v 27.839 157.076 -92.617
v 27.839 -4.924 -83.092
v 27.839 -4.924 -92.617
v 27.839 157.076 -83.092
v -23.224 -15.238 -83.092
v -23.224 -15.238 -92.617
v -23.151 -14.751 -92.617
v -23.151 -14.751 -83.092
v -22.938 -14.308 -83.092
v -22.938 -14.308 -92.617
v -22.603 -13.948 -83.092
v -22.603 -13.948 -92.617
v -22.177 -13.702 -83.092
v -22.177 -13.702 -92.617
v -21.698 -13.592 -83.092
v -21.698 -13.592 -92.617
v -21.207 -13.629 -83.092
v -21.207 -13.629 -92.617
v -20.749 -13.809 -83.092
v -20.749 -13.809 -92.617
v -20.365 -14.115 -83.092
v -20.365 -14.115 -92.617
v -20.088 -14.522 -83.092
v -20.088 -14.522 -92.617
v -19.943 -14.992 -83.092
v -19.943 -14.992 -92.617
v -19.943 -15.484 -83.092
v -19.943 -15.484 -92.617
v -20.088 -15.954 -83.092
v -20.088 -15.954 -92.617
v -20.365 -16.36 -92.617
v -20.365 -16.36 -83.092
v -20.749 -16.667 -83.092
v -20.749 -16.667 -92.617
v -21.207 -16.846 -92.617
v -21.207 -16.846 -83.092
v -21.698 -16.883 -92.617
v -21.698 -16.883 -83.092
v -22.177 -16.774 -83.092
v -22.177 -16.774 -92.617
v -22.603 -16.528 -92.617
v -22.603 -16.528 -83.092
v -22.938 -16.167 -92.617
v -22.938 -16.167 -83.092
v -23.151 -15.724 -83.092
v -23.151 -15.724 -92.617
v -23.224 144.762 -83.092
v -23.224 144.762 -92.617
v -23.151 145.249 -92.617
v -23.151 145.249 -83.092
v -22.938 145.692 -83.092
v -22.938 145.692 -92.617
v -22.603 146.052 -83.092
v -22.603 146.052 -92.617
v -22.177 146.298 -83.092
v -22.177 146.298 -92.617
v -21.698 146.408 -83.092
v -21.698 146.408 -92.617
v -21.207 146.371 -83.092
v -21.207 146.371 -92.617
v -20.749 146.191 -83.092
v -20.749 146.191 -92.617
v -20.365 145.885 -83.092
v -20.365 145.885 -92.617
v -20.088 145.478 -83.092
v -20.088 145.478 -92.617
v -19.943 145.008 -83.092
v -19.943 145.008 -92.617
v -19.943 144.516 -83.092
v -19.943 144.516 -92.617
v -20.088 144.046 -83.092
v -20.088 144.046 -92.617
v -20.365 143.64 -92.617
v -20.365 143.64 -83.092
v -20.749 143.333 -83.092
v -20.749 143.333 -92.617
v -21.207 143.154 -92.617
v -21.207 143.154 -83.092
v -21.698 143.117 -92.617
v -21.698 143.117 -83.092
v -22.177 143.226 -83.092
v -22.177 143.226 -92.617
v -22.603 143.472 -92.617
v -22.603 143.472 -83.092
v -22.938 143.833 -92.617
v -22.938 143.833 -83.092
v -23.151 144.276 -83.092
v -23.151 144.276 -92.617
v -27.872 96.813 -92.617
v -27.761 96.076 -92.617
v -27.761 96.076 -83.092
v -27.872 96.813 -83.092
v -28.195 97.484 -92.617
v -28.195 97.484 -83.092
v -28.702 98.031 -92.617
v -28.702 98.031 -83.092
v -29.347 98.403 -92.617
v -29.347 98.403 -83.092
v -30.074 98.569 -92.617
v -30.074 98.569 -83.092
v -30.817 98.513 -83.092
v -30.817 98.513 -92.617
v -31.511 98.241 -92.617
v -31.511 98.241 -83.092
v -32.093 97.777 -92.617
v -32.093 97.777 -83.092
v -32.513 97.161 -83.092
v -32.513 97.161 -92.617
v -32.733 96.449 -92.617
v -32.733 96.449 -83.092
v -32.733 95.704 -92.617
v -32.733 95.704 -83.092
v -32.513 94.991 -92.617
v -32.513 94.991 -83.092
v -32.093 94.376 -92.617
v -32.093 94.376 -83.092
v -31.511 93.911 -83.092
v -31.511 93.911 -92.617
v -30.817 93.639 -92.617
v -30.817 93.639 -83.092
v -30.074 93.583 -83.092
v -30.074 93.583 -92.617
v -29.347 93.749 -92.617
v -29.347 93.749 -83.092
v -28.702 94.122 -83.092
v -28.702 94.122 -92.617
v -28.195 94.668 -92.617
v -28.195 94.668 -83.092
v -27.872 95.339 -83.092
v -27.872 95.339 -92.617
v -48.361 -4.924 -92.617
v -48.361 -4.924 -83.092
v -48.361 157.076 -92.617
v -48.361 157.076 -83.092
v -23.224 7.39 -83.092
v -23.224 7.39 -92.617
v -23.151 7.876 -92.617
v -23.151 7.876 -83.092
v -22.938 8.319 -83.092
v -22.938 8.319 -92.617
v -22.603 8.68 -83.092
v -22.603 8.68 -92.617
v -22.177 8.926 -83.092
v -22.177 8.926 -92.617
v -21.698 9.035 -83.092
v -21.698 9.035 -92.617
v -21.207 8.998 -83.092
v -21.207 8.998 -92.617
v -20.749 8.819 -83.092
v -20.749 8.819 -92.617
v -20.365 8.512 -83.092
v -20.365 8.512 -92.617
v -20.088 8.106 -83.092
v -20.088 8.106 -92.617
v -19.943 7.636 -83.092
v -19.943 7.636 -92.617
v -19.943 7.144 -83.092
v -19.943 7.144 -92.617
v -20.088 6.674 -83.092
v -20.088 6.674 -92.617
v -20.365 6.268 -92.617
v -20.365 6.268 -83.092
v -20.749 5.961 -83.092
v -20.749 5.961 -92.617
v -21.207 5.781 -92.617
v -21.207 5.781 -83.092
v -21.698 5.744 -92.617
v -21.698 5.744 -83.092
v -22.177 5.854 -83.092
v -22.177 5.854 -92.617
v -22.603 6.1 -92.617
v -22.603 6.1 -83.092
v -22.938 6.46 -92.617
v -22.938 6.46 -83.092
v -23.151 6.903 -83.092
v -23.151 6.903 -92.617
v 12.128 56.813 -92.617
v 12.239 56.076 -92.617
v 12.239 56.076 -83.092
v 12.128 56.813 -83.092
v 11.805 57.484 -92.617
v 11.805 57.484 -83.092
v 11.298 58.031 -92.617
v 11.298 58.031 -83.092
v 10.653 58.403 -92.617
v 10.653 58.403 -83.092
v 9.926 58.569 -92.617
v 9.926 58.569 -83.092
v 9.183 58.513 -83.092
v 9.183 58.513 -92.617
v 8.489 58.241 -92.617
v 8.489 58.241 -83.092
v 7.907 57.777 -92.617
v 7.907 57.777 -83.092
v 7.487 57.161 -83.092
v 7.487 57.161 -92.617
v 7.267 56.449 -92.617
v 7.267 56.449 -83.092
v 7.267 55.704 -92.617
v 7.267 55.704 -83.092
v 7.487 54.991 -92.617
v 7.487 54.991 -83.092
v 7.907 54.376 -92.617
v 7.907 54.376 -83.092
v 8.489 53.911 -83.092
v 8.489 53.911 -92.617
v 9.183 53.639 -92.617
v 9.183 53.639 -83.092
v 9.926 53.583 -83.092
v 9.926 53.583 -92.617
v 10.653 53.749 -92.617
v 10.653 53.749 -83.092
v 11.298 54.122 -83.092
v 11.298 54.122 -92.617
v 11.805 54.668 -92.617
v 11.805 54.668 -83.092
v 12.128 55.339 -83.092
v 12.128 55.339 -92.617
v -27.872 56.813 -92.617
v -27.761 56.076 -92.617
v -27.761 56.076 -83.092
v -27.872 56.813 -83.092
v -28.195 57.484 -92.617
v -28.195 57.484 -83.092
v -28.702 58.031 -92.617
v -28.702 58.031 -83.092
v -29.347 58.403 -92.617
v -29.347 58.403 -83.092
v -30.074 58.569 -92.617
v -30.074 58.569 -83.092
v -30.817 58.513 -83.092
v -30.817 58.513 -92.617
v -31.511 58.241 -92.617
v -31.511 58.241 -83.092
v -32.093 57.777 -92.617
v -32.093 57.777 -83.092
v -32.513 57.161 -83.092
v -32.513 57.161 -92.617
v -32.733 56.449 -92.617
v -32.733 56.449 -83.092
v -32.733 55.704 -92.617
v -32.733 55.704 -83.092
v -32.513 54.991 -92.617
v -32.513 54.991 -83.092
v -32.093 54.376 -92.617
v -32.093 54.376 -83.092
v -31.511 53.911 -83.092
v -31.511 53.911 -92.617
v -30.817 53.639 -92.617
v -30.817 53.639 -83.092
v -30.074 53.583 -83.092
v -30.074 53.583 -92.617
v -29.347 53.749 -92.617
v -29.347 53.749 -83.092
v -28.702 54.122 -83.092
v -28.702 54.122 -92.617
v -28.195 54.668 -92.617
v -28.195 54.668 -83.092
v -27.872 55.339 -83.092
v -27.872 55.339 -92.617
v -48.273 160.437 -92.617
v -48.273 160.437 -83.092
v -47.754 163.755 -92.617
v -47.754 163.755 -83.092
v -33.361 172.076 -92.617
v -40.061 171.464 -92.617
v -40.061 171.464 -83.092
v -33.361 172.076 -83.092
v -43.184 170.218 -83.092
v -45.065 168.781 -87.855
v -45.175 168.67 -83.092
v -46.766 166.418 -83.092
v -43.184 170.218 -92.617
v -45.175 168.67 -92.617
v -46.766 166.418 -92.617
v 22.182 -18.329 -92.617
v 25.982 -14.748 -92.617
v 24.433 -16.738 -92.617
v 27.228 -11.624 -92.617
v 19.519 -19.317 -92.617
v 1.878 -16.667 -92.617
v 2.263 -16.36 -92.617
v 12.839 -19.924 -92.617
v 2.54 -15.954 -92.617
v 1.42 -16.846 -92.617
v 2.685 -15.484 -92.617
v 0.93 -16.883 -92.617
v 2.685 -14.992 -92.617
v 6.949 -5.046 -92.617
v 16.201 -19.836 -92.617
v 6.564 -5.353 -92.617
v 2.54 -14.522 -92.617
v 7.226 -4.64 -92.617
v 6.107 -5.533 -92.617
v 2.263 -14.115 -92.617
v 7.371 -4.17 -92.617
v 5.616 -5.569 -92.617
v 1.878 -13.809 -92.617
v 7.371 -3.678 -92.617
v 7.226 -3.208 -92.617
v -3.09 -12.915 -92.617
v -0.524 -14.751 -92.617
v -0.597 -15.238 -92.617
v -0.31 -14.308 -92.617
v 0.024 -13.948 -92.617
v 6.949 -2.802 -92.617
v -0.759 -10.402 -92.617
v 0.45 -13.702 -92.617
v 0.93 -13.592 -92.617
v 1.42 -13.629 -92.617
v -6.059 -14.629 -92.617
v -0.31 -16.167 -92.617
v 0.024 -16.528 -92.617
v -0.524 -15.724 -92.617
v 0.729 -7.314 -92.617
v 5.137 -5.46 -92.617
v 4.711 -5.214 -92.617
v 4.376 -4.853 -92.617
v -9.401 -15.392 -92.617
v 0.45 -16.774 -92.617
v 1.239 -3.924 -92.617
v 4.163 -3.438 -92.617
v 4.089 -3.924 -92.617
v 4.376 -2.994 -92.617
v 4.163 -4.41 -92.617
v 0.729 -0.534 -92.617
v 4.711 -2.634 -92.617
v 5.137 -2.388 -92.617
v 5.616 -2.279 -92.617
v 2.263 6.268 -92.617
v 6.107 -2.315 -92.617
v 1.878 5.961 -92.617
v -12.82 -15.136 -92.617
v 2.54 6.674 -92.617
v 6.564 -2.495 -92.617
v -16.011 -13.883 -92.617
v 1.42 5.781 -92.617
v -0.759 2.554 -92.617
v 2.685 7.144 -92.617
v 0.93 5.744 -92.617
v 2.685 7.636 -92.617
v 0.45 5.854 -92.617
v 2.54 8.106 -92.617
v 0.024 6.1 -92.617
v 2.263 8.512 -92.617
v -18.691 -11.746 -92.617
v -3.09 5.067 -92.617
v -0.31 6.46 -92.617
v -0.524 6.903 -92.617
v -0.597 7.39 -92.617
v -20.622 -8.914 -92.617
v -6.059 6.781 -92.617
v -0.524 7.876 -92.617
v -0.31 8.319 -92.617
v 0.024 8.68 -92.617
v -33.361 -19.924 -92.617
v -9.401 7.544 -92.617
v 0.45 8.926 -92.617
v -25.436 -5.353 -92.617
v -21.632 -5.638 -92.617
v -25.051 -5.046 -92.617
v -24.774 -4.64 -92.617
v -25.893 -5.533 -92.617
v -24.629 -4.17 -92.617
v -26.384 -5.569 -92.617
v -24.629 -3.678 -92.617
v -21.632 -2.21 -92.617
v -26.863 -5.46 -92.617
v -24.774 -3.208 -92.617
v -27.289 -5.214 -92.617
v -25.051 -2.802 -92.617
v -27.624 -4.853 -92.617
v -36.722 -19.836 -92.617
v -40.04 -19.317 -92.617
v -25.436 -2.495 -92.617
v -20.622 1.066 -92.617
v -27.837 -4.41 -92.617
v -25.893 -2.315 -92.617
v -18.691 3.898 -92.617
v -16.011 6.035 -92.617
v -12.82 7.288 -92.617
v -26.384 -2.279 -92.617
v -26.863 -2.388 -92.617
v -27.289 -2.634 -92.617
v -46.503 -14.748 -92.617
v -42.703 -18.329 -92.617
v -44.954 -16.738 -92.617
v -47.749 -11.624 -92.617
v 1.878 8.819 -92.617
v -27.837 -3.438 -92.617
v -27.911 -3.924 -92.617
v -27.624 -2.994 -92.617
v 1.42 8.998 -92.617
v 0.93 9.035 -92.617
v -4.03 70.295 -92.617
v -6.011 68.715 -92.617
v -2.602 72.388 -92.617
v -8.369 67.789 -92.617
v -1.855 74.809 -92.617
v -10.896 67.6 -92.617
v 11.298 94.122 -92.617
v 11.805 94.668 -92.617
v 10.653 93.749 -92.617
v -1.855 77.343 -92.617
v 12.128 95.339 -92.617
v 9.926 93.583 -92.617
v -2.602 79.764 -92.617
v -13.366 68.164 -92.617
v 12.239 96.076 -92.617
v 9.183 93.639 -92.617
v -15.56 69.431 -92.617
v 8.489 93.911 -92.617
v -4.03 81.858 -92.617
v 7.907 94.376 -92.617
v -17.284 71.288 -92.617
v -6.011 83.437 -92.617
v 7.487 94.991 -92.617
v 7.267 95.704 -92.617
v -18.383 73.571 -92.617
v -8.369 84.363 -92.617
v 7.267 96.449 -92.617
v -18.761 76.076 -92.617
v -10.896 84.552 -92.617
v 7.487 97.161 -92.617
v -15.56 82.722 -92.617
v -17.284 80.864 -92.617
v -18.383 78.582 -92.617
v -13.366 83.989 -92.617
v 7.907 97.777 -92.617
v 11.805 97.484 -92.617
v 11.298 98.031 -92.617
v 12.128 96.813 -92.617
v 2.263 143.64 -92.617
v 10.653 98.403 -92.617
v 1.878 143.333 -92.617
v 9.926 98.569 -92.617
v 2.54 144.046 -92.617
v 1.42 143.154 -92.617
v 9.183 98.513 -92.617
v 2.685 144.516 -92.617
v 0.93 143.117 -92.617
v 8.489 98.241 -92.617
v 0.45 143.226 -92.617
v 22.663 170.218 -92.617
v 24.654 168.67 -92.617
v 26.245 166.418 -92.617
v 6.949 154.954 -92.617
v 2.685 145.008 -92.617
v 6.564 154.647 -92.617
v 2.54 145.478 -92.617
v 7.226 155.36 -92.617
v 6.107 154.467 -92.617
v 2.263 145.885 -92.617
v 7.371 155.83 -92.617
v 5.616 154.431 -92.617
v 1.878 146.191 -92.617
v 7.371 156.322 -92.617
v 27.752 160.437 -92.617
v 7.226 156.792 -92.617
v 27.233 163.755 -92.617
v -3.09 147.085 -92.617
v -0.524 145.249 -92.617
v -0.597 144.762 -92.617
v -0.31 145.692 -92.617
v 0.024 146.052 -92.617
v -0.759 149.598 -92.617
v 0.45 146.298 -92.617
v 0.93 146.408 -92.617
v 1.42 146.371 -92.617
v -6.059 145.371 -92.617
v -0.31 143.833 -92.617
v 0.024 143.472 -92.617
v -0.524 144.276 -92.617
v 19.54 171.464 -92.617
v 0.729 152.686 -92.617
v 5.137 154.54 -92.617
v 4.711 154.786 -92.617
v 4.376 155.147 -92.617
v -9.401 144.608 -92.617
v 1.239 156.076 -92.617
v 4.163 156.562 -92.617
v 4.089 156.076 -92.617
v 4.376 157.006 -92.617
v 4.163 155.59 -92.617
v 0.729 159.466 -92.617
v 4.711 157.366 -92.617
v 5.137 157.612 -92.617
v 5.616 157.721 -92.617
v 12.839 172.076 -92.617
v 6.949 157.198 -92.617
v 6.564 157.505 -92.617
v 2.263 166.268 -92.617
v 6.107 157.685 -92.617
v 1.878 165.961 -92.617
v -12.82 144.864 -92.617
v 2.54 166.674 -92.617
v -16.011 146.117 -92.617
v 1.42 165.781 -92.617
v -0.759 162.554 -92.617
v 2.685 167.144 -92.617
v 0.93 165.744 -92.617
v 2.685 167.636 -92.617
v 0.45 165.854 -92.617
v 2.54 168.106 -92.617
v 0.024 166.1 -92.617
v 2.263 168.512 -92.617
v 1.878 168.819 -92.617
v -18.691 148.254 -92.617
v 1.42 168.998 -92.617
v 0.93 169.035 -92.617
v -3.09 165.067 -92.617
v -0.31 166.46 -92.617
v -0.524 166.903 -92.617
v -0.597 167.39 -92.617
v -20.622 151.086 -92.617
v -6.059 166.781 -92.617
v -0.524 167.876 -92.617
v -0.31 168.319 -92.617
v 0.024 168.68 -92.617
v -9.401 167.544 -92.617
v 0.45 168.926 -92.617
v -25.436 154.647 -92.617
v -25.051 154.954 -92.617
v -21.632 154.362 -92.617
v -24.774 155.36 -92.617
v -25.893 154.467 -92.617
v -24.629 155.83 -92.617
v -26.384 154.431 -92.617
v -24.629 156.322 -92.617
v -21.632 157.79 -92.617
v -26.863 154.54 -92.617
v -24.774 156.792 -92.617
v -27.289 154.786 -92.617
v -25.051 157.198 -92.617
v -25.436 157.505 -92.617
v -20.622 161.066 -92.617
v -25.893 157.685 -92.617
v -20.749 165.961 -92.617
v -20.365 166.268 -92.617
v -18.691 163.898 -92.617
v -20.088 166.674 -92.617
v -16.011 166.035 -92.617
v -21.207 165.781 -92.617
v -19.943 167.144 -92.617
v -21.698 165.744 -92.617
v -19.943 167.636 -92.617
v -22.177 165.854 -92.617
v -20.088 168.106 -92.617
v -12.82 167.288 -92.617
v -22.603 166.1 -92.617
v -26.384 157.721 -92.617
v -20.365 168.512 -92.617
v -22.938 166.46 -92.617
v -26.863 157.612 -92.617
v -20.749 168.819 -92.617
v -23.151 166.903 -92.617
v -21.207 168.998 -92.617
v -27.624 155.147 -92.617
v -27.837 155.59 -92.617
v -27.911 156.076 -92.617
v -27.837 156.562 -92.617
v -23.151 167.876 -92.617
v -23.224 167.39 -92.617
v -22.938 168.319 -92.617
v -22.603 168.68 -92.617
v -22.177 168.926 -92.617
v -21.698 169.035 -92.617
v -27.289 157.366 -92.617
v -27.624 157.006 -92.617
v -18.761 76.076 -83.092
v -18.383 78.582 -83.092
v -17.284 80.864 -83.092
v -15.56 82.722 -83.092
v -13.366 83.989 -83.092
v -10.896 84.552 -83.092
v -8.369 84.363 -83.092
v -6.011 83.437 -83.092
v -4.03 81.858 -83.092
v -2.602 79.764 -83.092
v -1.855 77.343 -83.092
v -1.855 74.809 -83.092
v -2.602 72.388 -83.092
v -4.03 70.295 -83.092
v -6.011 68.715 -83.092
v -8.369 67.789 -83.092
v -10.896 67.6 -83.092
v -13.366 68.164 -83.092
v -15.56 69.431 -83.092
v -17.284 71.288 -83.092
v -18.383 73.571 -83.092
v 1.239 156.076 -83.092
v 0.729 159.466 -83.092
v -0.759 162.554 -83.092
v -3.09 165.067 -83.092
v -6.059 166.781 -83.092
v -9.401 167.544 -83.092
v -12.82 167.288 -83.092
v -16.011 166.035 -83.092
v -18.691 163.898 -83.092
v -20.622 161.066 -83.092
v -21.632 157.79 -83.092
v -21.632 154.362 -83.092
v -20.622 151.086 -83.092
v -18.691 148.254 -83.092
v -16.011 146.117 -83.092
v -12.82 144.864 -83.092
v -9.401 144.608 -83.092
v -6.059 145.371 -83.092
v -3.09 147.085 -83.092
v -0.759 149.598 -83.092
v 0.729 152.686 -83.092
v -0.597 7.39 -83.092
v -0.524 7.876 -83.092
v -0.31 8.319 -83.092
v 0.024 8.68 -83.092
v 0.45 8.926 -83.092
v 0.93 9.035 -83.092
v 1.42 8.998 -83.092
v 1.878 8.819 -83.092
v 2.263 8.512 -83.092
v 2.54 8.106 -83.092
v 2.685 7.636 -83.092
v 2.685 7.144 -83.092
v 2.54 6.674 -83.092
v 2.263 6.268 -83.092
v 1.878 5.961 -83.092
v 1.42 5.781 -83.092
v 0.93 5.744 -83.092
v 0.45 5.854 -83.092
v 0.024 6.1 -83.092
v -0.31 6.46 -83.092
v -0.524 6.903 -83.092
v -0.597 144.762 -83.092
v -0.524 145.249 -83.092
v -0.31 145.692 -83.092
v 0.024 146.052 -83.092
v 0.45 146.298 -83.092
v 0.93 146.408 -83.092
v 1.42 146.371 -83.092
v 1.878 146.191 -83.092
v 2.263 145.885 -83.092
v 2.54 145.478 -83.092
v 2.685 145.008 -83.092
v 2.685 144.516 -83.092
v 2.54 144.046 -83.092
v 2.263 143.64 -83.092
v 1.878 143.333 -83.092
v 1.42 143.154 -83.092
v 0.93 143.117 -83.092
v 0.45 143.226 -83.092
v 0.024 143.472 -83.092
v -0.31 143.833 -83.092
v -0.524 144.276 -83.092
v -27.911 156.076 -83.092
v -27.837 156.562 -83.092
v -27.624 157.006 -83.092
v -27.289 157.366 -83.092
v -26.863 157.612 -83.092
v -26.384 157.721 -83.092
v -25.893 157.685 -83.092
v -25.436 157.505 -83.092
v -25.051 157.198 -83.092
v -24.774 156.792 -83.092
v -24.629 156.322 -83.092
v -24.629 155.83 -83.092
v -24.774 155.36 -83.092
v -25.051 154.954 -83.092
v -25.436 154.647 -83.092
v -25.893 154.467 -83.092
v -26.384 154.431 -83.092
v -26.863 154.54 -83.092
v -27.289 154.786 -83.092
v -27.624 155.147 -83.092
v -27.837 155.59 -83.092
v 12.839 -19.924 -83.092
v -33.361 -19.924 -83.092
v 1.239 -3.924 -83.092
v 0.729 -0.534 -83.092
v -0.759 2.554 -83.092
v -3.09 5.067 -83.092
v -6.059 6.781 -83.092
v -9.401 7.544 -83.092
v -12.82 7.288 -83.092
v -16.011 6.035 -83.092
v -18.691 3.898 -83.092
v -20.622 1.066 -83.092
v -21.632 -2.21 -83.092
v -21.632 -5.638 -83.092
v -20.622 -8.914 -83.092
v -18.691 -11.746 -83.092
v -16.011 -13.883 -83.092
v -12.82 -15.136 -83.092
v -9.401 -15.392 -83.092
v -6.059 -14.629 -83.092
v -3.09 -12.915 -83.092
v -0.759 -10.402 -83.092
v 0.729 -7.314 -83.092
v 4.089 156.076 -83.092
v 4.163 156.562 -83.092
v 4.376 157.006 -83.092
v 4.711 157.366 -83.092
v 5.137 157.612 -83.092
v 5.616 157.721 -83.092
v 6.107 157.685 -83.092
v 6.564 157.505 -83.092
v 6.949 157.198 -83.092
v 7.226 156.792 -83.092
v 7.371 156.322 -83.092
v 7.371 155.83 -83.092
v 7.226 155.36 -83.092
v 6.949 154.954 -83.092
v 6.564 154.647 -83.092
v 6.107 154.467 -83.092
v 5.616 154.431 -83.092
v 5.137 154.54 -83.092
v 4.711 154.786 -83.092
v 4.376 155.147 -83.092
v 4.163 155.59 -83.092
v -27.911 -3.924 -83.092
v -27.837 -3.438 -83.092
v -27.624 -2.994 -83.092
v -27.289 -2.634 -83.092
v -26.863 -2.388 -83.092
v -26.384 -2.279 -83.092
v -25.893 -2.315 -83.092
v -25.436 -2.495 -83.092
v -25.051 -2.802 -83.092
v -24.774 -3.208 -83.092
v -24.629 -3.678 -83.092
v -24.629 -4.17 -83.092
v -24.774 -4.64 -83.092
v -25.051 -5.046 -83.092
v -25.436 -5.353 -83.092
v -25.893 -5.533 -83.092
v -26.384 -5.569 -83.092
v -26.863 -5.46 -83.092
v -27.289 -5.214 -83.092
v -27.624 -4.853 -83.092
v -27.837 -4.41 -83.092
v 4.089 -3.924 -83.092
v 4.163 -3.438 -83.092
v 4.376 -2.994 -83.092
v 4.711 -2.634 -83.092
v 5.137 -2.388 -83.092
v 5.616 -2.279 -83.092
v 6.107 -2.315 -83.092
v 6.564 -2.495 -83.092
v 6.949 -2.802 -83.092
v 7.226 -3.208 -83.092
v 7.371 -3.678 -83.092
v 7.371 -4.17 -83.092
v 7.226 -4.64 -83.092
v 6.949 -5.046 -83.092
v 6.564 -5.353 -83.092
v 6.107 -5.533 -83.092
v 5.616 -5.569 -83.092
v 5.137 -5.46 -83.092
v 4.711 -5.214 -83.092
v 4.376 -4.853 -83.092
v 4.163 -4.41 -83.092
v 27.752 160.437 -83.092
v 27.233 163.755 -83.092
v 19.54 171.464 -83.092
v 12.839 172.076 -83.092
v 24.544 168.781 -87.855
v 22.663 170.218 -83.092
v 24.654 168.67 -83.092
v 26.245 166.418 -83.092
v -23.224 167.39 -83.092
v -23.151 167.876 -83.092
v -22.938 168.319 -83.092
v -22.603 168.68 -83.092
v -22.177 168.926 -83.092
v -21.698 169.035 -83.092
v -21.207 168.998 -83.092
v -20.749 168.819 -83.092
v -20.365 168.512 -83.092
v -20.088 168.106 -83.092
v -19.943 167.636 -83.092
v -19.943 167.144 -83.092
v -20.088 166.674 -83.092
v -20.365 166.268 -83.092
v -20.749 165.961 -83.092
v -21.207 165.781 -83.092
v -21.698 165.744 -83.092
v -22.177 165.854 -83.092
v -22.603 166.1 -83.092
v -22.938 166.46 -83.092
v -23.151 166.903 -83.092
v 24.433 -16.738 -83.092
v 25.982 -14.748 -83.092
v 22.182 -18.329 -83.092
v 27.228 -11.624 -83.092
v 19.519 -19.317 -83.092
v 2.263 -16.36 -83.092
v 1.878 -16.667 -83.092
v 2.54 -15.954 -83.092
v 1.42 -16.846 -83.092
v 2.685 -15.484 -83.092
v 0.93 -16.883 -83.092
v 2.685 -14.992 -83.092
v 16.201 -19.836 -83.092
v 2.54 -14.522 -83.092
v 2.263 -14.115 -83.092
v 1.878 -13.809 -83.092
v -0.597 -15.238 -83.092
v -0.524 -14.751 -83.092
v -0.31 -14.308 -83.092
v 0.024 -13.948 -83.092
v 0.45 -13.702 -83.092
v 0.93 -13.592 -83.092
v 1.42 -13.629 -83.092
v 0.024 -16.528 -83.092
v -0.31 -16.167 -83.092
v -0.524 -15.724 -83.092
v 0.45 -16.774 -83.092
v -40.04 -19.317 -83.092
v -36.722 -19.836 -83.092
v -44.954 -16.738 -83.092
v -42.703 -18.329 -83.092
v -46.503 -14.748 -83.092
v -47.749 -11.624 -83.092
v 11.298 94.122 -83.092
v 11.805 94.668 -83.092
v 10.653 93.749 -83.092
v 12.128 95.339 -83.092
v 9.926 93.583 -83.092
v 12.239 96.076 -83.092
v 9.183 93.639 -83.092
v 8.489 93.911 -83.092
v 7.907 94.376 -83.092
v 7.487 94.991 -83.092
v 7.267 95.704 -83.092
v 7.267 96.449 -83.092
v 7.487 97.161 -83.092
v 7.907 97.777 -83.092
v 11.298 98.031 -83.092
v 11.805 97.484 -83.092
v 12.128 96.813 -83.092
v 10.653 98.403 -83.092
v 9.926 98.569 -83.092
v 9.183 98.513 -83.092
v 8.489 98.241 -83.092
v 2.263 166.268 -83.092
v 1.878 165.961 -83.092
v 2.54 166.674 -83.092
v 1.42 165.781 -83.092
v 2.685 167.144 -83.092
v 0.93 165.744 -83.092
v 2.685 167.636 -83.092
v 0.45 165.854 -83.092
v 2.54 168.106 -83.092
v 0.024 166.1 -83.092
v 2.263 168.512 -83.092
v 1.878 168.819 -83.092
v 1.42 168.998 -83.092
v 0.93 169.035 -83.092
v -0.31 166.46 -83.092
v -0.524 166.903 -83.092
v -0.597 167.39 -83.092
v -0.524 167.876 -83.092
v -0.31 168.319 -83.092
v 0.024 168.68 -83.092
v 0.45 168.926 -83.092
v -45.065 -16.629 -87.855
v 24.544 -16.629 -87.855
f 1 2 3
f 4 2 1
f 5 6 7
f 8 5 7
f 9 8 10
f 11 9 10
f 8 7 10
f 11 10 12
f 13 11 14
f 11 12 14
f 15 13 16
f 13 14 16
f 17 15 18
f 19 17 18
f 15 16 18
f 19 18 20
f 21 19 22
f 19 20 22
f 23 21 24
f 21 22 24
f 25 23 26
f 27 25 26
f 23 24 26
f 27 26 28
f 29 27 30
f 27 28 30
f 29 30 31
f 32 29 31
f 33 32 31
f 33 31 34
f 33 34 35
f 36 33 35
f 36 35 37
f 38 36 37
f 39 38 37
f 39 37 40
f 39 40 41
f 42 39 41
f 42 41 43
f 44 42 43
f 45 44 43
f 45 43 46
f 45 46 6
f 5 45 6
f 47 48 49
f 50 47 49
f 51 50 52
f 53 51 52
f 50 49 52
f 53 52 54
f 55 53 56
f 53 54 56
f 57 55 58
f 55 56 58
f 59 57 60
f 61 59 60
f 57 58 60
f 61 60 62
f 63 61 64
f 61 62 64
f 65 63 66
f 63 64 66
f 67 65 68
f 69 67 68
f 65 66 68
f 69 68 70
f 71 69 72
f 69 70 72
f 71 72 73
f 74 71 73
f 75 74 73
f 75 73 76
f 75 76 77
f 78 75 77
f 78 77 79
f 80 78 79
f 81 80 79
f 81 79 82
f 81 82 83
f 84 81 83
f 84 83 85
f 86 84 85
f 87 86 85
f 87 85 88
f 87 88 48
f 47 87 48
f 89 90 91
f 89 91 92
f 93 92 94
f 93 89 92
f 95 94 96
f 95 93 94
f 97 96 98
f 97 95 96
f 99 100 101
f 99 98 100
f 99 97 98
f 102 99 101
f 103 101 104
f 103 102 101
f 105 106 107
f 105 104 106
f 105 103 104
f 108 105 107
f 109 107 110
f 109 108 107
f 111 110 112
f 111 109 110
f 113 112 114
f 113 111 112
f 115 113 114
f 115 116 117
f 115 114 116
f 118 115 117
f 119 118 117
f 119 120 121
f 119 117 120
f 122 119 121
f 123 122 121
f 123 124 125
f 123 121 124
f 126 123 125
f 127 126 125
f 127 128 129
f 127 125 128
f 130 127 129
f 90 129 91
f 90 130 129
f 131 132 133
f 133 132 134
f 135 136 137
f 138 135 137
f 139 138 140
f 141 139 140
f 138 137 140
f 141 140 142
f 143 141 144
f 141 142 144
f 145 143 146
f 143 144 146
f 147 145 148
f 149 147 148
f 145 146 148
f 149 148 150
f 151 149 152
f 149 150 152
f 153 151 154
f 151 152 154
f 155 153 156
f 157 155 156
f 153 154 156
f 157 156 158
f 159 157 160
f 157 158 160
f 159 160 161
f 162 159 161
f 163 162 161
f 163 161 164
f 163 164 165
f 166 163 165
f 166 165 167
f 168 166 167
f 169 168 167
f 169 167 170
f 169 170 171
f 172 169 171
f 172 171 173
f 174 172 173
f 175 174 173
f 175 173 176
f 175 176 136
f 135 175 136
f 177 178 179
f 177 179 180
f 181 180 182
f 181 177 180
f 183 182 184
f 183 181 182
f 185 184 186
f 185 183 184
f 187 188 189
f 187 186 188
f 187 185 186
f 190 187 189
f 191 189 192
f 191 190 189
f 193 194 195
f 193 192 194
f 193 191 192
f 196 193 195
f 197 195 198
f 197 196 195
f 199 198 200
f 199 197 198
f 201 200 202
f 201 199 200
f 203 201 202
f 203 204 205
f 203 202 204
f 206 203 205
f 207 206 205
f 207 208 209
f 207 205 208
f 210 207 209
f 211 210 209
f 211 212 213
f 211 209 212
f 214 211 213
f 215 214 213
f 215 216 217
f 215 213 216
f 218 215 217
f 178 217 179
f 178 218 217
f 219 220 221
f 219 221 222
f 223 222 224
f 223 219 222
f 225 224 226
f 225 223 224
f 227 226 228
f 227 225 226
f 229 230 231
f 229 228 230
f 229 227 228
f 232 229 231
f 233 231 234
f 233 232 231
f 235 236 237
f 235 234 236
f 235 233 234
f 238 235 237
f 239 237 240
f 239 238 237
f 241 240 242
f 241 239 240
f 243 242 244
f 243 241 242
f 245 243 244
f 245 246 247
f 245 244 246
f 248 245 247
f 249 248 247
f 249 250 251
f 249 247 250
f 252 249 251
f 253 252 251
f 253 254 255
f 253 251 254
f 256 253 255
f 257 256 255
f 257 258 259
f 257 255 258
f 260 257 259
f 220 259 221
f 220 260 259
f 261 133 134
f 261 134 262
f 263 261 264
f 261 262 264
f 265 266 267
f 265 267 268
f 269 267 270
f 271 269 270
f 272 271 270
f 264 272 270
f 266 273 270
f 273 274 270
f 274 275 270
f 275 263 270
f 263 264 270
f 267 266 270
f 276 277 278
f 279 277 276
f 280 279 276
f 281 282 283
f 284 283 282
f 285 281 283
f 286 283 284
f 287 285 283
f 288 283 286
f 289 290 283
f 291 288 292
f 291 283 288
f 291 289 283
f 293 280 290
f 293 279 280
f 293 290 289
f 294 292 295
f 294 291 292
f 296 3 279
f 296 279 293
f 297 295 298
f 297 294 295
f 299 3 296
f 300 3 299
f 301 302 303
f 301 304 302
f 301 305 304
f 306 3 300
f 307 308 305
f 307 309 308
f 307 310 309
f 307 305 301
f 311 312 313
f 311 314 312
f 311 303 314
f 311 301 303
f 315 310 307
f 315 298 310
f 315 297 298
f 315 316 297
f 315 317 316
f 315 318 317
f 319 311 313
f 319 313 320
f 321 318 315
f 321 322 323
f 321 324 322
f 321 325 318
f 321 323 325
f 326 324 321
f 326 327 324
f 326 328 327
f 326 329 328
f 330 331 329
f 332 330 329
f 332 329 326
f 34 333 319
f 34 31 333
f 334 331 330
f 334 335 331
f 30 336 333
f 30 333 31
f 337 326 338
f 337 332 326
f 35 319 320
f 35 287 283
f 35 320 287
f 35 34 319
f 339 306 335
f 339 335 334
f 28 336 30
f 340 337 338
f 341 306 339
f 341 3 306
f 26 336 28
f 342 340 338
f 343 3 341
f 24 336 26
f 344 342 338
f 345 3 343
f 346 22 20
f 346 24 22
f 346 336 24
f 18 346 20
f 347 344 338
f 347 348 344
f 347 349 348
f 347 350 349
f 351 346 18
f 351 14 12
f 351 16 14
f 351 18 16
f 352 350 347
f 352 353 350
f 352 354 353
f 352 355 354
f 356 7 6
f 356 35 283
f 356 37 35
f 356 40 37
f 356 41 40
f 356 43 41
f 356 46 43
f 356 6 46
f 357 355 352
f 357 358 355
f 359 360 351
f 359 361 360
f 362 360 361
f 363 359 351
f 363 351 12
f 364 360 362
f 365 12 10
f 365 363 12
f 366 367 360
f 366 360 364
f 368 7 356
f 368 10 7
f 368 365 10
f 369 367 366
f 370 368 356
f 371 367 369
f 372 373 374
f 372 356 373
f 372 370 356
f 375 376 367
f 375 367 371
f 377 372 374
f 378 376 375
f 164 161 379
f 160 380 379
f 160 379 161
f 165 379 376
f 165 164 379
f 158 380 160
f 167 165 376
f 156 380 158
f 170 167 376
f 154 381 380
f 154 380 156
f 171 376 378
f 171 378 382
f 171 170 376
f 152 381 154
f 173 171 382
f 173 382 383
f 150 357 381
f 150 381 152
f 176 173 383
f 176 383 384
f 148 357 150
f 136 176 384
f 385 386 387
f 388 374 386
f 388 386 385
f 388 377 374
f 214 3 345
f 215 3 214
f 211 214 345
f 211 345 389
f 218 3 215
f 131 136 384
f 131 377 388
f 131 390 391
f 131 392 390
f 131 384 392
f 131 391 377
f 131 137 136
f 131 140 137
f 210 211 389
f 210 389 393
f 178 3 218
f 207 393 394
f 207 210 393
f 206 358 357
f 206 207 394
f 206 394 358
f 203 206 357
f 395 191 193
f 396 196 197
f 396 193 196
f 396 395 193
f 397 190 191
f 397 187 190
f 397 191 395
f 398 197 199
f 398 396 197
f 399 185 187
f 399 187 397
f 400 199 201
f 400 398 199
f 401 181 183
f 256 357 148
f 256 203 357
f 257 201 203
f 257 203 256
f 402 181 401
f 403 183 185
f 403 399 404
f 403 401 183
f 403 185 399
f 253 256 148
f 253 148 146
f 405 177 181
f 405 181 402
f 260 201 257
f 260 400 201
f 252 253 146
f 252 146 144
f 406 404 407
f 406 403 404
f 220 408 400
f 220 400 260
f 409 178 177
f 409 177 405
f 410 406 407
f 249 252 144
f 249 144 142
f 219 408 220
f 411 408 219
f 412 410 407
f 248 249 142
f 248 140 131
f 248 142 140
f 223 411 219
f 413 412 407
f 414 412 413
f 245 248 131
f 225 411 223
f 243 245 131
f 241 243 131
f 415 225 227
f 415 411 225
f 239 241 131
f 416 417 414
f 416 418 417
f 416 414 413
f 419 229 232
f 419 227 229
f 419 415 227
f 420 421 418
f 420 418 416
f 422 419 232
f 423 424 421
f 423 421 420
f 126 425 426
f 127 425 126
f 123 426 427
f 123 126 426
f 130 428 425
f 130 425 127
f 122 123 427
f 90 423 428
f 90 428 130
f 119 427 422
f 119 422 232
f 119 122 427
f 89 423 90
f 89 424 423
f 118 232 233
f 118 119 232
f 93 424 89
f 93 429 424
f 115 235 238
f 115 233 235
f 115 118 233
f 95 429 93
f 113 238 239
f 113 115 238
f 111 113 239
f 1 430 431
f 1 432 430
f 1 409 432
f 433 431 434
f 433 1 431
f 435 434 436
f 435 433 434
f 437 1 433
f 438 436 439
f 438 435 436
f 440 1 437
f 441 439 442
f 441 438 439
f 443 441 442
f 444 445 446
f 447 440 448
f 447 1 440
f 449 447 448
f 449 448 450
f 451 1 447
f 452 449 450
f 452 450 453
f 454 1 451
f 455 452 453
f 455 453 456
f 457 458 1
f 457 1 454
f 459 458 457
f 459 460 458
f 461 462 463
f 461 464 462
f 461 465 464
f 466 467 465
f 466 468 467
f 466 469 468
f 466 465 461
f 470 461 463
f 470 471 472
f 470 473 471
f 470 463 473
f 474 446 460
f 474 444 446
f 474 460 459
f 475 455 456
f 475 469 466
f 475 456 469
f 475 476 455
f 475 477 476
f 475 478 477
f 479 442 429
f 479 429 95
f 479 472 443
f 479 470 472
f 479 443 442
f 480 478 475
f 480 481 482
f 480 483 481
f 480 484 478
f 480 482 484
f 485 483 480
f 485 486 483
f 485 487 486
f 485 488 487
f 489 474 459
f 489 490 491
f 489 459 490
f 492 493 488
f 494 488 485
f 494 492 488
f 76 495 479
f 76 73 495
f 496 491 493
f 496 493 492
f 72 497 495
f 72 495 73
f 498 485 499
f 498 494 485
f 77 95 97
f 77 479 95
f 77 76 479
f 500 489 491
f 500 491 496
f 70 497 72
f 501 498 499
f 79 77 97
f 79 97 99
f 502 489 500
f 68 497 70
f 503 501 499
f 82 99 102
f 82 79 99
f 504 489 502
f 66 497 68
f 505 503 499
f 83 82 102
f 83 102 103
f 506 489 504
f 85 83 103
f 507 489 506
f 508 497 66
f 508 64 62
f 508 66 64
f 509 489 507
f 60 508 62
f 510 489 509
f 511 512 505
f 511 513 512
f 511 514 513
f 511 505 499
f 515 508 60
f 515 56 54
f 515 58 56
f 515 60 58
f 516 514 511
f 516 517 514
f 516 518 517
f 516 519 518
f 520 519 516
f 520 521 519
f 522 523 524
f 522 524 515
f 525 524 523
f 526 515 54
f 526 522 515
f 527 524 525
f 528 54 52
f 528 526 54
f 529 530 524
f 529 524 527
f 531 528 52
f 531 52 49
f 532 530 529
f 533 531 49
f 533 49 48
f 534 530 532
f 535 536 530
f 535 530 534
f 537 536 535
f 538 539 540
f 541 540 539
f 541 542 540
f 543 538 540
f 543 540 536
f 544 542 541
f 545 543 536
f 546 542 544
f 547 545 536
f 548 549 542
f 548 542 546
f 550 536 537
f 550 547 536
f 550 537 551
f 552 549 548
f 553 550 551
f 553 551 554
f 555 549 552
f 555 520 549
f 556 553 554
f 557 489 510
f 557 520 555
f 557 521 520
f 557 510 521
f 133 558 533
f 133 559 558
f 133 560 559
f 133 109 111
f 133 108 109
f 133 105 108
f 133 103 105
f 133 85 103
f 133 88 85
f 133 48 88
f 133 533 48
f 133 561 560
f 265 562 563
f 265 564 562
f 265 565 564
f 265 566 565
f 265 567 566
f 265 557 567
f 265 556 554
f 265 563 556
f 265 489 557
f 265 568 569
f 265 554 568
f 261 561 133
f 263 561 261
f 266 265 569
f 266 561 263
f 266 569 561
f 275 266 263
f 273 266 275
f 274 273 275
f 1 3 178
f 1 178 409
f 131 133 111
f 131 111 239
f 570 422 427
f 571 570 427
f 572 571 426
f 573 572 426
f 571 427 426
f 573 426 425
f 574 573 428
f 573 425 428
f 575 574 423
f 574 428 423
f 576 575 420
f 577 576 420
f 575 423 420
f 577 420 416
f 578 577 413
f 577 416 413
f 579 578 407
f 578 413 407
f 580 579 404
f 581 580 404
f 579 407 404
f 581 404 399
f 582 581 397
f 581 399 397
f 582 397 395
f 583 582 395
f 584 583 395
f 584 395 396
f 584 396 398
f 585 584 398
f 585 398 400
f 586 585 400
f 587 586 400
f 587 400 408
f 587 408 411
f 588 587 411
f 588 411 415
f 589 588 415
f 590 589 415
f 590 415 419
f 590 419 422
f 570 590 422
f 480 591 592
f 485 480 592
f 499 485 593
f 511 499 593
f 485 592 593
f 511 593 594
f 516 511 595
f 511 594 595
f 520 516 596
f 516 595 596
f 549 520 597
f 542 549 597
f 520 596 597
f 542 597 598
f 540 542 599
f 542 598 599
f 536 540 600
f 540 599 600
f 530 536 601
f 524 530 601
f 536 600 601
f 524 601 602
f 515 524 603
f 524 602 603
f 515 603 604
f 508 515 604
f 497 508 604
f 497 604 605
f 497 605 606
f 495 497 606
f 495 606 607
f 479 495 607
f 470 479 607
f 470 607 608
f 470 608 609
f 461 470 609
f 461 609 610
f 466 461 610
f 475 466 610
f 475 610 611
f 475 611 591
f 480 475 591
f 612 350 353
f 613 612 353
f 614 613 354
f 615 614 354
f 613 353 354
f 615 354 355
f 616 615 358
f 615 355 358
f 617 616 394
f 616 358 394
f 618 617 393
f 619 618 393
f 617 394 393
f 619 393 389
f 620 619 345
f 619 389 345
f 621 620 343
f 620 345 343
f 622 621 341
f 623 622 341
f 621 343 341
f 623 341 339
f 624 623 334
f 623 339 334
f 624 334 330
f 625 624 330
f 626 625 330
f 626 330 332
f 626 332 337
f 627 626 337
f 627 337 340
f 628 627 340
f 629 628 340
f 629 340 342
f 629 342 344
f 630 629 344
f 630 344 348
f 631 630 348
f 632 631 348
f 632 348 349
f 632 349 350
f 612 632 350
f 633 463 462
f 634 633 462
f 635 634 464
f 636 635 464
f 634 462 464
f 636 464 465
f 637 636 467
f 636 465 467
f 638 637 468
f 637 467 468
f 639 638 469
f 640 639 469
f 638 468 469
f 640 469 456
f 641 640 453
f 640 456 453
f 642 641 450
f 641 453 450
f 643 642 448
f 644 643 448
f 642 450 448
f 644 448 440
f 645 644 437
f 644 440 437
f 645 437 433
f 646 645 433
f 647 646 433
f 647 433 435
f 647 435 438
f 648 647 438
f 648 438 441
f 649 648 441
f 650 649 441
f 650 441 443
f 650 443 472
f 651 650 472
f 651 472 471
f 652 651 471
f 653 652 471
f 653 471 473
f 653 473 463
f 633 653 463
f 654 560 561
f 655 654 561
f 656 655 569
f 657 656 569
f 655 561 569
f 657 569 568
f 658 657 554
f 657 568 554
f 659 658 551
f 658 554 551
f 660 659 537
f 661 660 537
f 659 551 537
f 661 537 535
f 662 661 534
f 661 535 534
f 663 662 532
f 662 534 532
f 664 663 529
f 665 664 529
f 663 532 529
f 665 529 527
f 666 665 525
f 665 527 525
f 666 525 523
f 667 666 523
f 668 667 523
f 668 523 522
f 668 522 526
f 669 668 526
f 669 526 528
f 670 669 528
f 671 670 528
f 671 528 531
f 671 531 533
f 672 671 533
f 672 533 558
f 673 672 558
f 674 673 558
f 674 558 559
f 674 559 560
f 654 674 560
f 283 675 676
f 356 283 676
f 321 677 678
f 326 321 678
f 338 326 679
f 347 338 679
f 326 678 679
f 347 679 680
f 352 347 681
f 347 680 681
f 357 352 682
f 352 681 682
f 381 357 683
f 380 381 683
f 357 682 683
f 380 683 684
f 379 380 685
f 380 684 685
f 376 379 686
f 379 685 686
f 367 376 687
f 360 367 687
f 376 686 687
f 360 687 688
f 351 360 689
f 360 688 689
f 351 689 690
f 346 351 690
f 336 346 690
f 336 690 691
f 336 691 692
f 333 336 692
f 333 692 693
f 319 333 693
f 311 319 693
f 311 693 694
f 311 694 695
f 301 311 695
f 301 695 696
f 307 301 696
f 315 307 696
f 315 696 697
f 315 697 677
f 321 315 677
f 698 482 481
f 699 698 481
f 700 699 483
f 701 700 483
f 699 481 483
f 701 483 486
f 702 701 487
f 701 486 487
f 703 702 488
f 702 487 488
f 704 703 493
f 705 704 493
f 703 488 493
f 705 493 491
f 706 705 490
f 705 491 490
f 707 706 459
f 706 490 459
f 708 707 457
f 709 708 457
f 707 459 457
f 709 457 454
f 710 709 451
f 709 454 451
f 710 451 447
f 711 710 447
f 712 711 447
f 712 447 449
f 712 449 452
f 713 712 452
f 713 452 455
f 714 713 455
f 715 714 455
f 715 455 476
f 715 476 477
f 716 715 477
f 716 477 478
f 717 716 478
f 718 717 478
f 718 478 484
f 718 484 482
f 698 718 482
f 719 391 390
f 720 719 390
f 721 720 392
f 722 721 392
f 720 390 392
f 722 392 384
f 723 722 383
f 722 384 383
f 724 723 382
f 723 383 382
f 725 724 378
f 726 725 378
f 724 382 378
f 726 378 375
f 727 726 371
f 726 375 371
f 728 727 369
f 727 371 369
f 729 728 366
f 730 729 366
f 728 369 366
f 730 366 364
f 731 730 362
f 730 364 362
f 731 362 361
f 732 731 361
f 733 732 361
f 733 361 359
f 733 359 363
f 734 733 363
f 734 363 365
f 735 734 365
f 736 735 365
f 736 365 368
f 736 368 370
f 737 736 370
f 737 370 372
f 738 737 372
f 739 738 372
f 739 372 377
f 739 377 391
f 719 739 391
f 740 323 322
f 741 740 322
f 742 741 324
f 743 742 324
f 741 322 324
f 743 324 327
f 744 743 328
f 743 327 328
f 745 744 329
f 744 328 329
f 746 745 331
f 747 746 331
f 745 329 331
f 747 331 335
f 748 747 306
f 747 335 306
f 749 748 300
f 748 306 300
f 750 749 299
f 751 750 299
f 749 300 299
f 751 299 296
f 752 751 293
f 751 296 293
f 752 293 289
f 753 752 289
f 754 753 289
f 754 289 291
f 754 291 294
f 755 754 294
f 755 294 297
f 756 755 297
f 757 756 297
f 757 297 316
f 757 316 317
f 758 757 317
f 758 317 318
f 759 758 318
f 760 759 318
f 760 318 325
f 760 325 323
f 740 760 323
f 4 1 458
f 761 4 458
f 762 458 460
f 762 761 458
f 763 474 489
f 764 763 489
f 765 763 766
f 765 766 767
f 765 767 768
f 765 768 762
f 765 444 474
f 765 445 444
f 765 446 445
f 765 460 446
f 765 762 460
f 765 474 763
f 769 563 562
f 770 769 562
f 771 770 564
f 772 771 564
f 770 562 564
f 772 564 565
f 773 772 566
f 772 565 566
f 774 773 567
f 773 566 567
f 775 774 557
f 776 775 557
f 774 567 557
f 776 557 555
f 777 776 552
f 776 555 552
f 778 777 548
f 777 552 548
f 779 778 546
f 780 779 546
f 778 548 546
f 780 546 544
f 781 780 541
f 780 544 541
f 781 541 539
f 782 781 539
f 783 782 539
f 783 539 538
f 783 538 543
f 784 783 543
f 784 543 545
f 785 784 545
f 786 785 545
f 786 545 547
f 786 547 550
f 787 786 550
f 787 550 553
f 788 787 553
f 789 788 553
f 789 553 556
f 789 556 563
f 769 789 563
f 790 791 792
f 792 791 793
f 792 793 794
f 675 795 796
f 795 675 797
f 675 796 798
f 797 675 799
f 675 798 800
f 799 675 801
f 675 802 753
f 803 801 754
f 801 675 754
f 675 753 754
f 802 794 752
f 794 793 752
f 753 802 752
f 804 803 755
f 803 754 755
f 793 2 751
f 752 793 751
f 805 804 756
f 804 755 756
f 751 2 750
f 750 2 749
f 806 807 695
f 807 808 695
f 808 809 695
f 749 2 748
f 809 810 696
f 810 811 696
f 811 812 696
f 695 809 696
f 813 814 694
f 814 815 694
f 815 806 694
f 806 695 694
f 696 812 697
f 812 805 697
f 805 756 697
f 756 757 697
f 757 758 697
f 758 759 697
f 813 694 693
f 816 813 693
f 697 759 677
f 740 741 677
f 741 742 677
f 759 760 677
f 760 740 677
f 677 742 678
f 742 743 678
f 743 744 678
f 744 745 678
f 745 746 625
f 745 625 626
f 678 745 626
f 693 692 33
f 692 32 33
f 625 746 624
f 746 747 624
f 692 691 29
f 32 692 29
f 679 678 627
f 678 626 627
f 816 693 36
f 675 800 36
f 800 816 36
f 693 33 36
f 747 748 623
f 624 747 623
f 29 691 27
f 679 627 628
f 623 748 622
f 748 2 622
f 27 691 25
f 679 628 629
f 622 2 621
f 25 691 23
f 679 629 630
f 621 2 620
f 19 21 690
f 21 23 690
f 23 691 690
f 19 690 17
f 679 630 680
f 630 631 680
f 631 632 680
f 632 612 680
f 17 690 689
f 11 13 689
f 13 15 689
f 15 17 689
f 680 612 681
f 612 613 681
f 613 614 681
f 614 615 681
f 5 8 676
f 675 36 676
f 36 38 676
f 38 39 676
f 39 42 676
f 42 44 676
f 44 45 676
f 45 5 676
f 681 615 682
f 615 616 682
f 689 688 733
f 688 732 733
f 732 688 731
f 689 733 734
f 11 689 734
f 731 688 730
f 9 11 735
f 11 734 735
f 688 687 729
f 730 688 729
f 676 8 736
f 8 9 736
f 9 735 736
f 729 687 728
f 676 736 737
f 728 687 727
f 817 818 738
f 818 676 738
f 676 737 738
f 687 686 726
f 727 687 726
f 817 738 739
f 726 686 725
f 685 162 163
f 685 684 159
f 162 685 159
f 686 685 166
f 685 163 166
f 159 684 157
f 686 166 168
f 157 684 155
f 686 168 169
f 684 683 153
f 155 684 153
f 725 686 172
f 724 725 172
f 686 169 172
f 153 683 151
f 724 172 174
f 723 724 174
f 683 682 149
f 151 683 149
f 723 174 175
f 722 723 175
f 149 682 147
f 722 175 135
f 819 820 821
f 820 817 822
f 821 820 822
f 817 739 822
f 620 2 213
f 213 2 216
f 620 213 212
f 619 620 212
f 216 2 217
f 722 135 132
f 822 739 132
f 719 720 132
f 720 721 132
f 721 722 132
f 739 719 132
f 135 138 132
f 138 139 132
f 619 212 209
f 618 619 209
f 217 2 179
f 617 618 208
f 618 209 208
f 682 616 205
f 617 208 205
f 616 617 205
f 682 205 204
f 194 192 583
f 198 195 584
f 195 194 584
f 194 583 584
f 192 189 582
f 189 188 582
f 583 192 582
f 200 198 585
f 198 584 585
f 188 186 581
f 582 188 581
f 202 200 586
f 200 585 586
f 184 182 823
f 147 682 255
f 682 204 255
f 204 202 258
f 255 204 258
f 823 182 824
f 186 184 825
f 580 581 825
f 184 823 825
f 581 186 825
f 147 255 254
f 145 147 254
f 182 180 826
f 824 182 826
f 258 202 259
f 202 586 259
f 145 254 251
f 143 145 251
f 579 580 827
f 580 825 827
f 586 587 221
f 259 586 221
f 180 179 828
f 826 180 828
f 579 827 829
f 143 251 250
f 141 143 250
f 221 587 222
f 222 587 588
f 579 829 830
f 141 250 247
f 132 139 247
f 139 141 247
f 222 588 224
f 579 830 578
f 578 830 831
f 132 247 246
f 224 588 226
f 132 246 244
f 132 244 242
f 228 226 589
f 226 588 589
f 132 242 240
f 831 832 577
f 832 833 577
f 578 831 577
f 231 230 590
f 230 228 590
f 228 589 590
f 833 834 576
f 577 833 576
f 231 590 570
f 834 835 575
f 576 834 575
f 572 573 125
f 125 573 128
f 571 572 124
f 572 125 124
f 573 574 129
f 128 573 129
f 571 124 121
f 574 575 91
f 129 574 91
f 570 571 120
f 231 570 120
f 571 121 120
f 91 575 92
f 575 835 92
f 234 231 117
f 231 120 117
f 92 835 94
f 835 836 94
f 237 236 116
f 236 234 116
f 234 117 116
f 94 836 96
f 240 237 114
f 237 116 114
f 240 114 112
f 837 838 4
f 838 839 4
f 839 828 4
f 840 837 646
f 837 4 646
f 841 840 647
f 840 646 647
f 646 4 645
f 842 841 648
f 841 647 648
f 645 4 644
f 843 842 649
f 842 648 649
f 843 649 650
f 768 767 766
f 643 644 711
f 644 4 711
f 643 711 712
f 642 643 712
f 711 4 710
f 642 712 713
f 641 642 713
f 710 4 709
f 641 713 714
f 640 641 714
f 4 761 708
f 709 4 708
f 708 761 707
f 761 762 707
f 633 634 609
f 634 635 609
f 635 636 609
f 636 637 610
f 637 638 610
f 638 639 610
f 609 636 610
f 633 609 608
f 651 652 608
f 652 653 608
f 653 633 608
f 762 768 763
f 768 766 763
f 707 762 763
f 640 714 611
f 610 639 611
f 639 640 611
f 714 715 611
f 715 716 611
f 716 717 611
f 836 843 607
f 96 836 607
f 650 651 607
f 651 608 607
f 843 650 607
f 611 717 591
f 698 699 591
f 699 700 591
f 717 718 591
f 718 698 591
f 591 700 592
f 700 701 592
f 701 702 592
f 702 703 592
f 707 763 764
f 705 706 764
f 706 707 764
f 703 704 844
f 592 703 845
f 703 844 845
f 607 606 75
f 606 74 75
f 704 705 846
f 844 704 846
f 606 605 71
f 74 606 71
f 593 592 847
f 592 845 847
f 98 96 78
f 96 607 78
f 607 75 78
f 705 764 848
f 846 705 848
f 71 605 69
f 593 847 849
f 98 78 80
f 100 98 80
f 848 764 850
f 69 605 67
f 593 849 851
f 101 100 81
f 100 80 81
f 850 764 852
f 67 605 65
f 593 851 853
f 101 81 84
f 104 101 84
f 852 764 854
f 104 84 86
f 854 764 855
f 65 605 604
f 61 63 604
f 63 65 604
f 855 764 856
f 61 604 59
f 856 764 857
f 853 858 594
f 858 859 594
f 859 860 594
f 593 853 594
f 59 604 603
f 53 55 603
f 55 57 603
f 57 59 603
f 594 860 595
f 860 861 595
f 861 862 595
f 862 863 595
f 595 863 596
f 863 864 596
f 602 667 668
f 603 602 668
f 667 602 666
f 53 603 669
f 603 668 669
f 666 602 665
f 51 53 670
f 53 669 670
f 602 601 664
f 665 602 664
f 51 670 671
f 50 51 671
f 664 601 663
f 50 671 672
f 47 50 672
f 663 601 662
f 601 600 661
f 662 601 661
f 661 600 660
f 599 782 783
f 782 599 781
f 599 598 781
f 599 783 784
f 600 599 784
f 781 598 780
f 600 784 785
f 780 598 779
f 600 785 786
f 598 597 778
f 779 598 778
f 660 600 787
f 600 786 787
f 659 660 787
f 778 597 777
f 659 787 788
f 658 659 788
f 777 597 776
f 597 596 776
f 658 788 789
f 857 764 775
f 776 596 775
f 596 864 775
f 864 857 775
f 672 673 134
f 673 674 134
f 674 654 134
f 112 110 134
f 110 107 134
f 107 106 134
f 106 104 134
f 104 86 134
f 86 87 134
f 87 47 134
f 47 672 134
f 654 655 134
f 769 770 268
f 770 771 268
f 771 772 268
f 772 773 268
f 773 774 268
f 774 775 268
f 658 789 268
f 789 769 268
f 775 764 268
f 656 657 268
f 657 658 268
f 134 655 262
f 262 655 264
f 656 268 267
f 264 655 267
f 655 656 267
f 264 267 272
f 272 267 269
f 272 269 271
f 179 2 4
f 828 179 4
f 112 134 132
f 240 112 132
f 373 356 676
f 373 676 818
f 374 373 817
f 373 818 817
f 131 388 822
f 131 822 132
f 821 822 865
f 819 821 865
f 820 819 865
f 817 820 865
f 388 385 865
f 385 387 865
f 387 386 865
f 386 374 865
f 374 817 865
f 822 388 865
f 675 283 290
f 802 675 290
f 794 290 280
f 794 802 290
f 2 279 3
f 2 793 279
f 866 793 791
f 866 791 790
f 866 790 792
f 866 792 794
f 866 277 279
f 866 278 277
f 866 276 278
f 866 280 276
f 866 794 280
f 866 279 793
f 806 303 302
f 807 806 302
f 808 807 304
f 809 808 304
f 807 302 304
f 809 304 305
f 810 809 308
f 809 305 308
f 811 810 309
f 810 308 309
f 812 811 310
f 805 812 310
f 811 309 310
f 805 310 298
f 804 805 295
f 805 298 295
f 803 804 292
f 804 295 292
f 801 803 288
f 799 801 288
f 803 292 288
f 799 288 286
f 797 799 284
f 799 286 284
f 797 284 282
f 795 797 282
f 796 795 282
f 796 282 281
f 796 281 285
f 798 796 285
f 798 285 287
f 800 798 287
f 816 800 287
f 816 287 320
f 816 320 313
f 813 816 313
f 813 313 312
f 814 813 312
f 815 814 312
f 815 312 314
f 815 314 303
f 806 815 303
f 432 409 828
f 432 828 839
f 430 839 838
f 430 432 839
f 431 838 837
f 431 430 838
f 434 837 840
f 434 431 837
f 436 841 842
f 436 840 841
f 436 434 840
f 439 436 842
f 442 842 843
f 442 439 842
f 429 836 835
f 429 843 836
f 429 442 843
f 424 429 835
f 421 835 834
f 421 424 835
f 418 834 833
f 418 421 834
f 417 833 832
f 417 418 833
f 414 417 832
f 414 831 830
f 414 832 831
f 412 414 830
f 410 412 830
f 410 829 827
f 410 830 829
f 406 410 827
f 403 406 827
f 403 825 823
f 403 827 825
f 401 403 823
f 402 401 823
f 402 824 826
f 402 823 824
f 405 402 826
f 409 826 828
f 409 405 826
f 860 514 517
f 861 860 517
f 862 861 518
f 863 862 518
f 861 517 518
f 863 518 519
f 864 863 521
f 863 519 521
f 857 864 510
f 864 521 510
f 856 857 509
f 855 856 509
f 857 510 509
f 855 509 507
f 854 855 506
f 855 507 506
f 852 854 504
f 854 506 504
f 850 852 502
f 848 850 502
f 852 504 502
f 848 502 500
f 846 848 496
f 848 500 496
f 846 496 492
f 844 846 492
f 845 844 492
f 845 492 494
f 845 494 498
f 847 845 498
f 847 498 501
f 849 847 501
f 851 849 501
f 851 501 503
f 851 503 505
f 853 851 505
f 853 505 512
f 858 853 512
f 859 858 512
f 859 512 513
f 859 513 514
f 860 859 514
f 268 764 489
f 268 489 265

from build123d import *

# Parameters (mm, degrees)
SKETCH2_W                     = 76.2
SKETCH2_H                     = 192
BOSS_EXTRUDE1_DEPTH           = 9.525
M16_CLEARANCE_HOLE1_D         = 17
M4X0_7_TAPPED_HOLE1_D         = 3.3
SKETCH9_R                     = 11.5
CUT_EXTRUDE1_DEPTH            = 179.996240317
FILLET1_SIZE                  = 15
M6X1_0_START                  = -94
M6X1_0_TAPPED_HOLE1_OUTLINE_R = 2.5
M6X1_0_TAPPED_HOLE1_DEPTH     = 12


with BuildPart() as part:
    # Sketch2 → Boss-Extrude1 (new body)
    with BuildSketch(Plane(origin=(0, 0, -83.092064992), x_dir=(-1, 0, 0), z_dir=(0, 0, -1))):
        with Locations((10.260528885, 76.076110104)):
            Rectangle(SKETCH2_W, SKETCH2_H)
    extrude(amount=BOSS_EXTRUDE1_DEPTH)

    # M16 Clearance Hole1 (through all)
    with Locations(Plane.XY.offset(-83.092064992)):
        with Locations((-10.260528885, 76.076110104)):
            Hole(M16_CLEARANCE_HOLE1_D / 2)

    # M4x0.7 Tapped Hole1 (through all)
    with Locations(Plane.XY.offset(-83.092064992)):
        with Locations((-21.574237384, 144.762401605), (-26.260528885, 156.076110104), (-21.574237384, 167.389818603), (1.053179614, 144.762401605), (5.739471115, 156.076110104), (1.053179614, 167.389818603), (1.053179614, 7.389818603), (1.053179614, -15.237598395), (-21.574237384, -15.237598395), (-26.260528885, -3.923889896), (-21.574237384, 7.389818603), (5.739471115, -3.923889896)):
            Hole(M4X0_7_TAPPED_HOLE1_D / 2)

    # Sketch9 → Cut-Extrude1 (cut, through all)
    with BuildSketch(Plane.XY.offset(-83.092064992)):
        with Locations((-10.260528885, 156.076110104)):
            Circle(SKETCH9_R)
        with Locations((-10.260528885, -3.923889896)):
            Circle(SKETCH9_R)
    extrude(amount=-CUT_EXTRUDE1_DEPTH, mode=Mode.SUBTRACT)

    # Fillet1
    # a fillet whose section is not a circle: 15 mm, written as the material it takes off along each edge
    with BuildSketch(Plane(origin=(27.839471115, 172.076110104, -45.592064992), x_dir=(0, -1, 0), z_dir=(0, 0, -1)), Plane(origin=(27.839471115, -19.923889896, -45.592064992), x_dir=(-1, 0, 0), z_dir=(0, 0, -1))) as fillet1_piece_1:
        with BuildLine():
            add(Edge.make_bspline([(FILLET1_SIZE, 0), (FILLET1_SIZE * 0.831801948466, 0), (FILLET1_SIZE * 0.663603896932, 0), (FILLET1_SIZE * 0.292893218813, FILLET1_SIZE * 0.0716919198361), (FILLET1_SIZE * 0.0716919198361, FILLET1_SIZE * 0.292893218813), (0, FILLET1_SIZE * 0.663603896932), (0, FILLET1_SIZE * 0.831801948466), (0, FILLET1_SIZE)], knots=[0, 0, 0, 0, 0, 0, 0.5, 0.5, 1, 1, 1, 1, 1, 1], degree=5))
            Line((0, FILLET1_SIZE), (0, 0))
            Line((0, 0), (FILLET1_SIZE, 0))
        make_face()
    extrude(amount=84.525, mode=Mode.SUBTRACT)
    with BuildSketch(Plane(origin=(-48.360528885, -19.923889896, -45.592064992), x_dir=(1, 0, 0), z_dir=(0, 0, -1)), Plane(origin=(-48.360528885, 172.076110104, -45.592064992), x_dir=(0, -1, 0), z_dir=(0, 0, -1))) as fillet1_piece_2:
        with BuildLine():
            add(Edge.make_bspline([(FILLET1_SIZE, 0), (FILLET1_SIZE * 0.831801948466, 0), (FILLET1_SIZE * 0.663603896932, 0), (FILLET1_SIZE * 0.292893218813, -FILLET1_SIZE * 0.0716919198361), (FILLET1_SIZE * 0.0716919198361, -FILLET1_SIZE * 0.292893218813), (0, -FILLET1_SIZE * 0.663603896932), (0, -FILLET1_SIZE * 0.831801948466), (0, -FILLET1_SIZE)], knots=[0, 0, 0, 0, 0, 0, 0.5, 0.5, 1, 1, 1, 1, 1, 1], degree=5))
            Line((0, -FILLET1_SIZE), (0, 0))
            Line((0, 0), (FILLET1_SIZE, 0))
        make_face()
    extrude(amount=84.525, mode=Mode.SUBTRACT)

    # M6x1.0 Tapped Hole1: read off the stored shape, not the designer's step
    # M6x1.0 Tapped Hole1 outline → M6x1.0 Tapped Hole1 (cut)
    with BuildSketch(Plane.XY.offset(M6X1_0_START)):
        with Locations((-30.260528885, 96.076110104)):
            Circle(M6X1_0_TAPPED_HOLE1_OUTLINE_R)
        with Locations((9.739471115, 56.076110104)):
            Circle(M6X1_0_TAPPED_HOLE1_OUTLINE_R)
        with Locations((-30.260528885, 56.076110104)):
            Circle(M6X1_0_TAPPED_HOLE1_OUTLINE_R)
        with Locations((9.739471115, 96.076110104)):
            Circle(M6X1_0_TAPPED_HOLE1_OUTLINE_R)
    extrude(amount=M6X1_0_TAPPED_HOLE1_DEPTH, mode=Mode.SUBTRACT)


solid = part.part
